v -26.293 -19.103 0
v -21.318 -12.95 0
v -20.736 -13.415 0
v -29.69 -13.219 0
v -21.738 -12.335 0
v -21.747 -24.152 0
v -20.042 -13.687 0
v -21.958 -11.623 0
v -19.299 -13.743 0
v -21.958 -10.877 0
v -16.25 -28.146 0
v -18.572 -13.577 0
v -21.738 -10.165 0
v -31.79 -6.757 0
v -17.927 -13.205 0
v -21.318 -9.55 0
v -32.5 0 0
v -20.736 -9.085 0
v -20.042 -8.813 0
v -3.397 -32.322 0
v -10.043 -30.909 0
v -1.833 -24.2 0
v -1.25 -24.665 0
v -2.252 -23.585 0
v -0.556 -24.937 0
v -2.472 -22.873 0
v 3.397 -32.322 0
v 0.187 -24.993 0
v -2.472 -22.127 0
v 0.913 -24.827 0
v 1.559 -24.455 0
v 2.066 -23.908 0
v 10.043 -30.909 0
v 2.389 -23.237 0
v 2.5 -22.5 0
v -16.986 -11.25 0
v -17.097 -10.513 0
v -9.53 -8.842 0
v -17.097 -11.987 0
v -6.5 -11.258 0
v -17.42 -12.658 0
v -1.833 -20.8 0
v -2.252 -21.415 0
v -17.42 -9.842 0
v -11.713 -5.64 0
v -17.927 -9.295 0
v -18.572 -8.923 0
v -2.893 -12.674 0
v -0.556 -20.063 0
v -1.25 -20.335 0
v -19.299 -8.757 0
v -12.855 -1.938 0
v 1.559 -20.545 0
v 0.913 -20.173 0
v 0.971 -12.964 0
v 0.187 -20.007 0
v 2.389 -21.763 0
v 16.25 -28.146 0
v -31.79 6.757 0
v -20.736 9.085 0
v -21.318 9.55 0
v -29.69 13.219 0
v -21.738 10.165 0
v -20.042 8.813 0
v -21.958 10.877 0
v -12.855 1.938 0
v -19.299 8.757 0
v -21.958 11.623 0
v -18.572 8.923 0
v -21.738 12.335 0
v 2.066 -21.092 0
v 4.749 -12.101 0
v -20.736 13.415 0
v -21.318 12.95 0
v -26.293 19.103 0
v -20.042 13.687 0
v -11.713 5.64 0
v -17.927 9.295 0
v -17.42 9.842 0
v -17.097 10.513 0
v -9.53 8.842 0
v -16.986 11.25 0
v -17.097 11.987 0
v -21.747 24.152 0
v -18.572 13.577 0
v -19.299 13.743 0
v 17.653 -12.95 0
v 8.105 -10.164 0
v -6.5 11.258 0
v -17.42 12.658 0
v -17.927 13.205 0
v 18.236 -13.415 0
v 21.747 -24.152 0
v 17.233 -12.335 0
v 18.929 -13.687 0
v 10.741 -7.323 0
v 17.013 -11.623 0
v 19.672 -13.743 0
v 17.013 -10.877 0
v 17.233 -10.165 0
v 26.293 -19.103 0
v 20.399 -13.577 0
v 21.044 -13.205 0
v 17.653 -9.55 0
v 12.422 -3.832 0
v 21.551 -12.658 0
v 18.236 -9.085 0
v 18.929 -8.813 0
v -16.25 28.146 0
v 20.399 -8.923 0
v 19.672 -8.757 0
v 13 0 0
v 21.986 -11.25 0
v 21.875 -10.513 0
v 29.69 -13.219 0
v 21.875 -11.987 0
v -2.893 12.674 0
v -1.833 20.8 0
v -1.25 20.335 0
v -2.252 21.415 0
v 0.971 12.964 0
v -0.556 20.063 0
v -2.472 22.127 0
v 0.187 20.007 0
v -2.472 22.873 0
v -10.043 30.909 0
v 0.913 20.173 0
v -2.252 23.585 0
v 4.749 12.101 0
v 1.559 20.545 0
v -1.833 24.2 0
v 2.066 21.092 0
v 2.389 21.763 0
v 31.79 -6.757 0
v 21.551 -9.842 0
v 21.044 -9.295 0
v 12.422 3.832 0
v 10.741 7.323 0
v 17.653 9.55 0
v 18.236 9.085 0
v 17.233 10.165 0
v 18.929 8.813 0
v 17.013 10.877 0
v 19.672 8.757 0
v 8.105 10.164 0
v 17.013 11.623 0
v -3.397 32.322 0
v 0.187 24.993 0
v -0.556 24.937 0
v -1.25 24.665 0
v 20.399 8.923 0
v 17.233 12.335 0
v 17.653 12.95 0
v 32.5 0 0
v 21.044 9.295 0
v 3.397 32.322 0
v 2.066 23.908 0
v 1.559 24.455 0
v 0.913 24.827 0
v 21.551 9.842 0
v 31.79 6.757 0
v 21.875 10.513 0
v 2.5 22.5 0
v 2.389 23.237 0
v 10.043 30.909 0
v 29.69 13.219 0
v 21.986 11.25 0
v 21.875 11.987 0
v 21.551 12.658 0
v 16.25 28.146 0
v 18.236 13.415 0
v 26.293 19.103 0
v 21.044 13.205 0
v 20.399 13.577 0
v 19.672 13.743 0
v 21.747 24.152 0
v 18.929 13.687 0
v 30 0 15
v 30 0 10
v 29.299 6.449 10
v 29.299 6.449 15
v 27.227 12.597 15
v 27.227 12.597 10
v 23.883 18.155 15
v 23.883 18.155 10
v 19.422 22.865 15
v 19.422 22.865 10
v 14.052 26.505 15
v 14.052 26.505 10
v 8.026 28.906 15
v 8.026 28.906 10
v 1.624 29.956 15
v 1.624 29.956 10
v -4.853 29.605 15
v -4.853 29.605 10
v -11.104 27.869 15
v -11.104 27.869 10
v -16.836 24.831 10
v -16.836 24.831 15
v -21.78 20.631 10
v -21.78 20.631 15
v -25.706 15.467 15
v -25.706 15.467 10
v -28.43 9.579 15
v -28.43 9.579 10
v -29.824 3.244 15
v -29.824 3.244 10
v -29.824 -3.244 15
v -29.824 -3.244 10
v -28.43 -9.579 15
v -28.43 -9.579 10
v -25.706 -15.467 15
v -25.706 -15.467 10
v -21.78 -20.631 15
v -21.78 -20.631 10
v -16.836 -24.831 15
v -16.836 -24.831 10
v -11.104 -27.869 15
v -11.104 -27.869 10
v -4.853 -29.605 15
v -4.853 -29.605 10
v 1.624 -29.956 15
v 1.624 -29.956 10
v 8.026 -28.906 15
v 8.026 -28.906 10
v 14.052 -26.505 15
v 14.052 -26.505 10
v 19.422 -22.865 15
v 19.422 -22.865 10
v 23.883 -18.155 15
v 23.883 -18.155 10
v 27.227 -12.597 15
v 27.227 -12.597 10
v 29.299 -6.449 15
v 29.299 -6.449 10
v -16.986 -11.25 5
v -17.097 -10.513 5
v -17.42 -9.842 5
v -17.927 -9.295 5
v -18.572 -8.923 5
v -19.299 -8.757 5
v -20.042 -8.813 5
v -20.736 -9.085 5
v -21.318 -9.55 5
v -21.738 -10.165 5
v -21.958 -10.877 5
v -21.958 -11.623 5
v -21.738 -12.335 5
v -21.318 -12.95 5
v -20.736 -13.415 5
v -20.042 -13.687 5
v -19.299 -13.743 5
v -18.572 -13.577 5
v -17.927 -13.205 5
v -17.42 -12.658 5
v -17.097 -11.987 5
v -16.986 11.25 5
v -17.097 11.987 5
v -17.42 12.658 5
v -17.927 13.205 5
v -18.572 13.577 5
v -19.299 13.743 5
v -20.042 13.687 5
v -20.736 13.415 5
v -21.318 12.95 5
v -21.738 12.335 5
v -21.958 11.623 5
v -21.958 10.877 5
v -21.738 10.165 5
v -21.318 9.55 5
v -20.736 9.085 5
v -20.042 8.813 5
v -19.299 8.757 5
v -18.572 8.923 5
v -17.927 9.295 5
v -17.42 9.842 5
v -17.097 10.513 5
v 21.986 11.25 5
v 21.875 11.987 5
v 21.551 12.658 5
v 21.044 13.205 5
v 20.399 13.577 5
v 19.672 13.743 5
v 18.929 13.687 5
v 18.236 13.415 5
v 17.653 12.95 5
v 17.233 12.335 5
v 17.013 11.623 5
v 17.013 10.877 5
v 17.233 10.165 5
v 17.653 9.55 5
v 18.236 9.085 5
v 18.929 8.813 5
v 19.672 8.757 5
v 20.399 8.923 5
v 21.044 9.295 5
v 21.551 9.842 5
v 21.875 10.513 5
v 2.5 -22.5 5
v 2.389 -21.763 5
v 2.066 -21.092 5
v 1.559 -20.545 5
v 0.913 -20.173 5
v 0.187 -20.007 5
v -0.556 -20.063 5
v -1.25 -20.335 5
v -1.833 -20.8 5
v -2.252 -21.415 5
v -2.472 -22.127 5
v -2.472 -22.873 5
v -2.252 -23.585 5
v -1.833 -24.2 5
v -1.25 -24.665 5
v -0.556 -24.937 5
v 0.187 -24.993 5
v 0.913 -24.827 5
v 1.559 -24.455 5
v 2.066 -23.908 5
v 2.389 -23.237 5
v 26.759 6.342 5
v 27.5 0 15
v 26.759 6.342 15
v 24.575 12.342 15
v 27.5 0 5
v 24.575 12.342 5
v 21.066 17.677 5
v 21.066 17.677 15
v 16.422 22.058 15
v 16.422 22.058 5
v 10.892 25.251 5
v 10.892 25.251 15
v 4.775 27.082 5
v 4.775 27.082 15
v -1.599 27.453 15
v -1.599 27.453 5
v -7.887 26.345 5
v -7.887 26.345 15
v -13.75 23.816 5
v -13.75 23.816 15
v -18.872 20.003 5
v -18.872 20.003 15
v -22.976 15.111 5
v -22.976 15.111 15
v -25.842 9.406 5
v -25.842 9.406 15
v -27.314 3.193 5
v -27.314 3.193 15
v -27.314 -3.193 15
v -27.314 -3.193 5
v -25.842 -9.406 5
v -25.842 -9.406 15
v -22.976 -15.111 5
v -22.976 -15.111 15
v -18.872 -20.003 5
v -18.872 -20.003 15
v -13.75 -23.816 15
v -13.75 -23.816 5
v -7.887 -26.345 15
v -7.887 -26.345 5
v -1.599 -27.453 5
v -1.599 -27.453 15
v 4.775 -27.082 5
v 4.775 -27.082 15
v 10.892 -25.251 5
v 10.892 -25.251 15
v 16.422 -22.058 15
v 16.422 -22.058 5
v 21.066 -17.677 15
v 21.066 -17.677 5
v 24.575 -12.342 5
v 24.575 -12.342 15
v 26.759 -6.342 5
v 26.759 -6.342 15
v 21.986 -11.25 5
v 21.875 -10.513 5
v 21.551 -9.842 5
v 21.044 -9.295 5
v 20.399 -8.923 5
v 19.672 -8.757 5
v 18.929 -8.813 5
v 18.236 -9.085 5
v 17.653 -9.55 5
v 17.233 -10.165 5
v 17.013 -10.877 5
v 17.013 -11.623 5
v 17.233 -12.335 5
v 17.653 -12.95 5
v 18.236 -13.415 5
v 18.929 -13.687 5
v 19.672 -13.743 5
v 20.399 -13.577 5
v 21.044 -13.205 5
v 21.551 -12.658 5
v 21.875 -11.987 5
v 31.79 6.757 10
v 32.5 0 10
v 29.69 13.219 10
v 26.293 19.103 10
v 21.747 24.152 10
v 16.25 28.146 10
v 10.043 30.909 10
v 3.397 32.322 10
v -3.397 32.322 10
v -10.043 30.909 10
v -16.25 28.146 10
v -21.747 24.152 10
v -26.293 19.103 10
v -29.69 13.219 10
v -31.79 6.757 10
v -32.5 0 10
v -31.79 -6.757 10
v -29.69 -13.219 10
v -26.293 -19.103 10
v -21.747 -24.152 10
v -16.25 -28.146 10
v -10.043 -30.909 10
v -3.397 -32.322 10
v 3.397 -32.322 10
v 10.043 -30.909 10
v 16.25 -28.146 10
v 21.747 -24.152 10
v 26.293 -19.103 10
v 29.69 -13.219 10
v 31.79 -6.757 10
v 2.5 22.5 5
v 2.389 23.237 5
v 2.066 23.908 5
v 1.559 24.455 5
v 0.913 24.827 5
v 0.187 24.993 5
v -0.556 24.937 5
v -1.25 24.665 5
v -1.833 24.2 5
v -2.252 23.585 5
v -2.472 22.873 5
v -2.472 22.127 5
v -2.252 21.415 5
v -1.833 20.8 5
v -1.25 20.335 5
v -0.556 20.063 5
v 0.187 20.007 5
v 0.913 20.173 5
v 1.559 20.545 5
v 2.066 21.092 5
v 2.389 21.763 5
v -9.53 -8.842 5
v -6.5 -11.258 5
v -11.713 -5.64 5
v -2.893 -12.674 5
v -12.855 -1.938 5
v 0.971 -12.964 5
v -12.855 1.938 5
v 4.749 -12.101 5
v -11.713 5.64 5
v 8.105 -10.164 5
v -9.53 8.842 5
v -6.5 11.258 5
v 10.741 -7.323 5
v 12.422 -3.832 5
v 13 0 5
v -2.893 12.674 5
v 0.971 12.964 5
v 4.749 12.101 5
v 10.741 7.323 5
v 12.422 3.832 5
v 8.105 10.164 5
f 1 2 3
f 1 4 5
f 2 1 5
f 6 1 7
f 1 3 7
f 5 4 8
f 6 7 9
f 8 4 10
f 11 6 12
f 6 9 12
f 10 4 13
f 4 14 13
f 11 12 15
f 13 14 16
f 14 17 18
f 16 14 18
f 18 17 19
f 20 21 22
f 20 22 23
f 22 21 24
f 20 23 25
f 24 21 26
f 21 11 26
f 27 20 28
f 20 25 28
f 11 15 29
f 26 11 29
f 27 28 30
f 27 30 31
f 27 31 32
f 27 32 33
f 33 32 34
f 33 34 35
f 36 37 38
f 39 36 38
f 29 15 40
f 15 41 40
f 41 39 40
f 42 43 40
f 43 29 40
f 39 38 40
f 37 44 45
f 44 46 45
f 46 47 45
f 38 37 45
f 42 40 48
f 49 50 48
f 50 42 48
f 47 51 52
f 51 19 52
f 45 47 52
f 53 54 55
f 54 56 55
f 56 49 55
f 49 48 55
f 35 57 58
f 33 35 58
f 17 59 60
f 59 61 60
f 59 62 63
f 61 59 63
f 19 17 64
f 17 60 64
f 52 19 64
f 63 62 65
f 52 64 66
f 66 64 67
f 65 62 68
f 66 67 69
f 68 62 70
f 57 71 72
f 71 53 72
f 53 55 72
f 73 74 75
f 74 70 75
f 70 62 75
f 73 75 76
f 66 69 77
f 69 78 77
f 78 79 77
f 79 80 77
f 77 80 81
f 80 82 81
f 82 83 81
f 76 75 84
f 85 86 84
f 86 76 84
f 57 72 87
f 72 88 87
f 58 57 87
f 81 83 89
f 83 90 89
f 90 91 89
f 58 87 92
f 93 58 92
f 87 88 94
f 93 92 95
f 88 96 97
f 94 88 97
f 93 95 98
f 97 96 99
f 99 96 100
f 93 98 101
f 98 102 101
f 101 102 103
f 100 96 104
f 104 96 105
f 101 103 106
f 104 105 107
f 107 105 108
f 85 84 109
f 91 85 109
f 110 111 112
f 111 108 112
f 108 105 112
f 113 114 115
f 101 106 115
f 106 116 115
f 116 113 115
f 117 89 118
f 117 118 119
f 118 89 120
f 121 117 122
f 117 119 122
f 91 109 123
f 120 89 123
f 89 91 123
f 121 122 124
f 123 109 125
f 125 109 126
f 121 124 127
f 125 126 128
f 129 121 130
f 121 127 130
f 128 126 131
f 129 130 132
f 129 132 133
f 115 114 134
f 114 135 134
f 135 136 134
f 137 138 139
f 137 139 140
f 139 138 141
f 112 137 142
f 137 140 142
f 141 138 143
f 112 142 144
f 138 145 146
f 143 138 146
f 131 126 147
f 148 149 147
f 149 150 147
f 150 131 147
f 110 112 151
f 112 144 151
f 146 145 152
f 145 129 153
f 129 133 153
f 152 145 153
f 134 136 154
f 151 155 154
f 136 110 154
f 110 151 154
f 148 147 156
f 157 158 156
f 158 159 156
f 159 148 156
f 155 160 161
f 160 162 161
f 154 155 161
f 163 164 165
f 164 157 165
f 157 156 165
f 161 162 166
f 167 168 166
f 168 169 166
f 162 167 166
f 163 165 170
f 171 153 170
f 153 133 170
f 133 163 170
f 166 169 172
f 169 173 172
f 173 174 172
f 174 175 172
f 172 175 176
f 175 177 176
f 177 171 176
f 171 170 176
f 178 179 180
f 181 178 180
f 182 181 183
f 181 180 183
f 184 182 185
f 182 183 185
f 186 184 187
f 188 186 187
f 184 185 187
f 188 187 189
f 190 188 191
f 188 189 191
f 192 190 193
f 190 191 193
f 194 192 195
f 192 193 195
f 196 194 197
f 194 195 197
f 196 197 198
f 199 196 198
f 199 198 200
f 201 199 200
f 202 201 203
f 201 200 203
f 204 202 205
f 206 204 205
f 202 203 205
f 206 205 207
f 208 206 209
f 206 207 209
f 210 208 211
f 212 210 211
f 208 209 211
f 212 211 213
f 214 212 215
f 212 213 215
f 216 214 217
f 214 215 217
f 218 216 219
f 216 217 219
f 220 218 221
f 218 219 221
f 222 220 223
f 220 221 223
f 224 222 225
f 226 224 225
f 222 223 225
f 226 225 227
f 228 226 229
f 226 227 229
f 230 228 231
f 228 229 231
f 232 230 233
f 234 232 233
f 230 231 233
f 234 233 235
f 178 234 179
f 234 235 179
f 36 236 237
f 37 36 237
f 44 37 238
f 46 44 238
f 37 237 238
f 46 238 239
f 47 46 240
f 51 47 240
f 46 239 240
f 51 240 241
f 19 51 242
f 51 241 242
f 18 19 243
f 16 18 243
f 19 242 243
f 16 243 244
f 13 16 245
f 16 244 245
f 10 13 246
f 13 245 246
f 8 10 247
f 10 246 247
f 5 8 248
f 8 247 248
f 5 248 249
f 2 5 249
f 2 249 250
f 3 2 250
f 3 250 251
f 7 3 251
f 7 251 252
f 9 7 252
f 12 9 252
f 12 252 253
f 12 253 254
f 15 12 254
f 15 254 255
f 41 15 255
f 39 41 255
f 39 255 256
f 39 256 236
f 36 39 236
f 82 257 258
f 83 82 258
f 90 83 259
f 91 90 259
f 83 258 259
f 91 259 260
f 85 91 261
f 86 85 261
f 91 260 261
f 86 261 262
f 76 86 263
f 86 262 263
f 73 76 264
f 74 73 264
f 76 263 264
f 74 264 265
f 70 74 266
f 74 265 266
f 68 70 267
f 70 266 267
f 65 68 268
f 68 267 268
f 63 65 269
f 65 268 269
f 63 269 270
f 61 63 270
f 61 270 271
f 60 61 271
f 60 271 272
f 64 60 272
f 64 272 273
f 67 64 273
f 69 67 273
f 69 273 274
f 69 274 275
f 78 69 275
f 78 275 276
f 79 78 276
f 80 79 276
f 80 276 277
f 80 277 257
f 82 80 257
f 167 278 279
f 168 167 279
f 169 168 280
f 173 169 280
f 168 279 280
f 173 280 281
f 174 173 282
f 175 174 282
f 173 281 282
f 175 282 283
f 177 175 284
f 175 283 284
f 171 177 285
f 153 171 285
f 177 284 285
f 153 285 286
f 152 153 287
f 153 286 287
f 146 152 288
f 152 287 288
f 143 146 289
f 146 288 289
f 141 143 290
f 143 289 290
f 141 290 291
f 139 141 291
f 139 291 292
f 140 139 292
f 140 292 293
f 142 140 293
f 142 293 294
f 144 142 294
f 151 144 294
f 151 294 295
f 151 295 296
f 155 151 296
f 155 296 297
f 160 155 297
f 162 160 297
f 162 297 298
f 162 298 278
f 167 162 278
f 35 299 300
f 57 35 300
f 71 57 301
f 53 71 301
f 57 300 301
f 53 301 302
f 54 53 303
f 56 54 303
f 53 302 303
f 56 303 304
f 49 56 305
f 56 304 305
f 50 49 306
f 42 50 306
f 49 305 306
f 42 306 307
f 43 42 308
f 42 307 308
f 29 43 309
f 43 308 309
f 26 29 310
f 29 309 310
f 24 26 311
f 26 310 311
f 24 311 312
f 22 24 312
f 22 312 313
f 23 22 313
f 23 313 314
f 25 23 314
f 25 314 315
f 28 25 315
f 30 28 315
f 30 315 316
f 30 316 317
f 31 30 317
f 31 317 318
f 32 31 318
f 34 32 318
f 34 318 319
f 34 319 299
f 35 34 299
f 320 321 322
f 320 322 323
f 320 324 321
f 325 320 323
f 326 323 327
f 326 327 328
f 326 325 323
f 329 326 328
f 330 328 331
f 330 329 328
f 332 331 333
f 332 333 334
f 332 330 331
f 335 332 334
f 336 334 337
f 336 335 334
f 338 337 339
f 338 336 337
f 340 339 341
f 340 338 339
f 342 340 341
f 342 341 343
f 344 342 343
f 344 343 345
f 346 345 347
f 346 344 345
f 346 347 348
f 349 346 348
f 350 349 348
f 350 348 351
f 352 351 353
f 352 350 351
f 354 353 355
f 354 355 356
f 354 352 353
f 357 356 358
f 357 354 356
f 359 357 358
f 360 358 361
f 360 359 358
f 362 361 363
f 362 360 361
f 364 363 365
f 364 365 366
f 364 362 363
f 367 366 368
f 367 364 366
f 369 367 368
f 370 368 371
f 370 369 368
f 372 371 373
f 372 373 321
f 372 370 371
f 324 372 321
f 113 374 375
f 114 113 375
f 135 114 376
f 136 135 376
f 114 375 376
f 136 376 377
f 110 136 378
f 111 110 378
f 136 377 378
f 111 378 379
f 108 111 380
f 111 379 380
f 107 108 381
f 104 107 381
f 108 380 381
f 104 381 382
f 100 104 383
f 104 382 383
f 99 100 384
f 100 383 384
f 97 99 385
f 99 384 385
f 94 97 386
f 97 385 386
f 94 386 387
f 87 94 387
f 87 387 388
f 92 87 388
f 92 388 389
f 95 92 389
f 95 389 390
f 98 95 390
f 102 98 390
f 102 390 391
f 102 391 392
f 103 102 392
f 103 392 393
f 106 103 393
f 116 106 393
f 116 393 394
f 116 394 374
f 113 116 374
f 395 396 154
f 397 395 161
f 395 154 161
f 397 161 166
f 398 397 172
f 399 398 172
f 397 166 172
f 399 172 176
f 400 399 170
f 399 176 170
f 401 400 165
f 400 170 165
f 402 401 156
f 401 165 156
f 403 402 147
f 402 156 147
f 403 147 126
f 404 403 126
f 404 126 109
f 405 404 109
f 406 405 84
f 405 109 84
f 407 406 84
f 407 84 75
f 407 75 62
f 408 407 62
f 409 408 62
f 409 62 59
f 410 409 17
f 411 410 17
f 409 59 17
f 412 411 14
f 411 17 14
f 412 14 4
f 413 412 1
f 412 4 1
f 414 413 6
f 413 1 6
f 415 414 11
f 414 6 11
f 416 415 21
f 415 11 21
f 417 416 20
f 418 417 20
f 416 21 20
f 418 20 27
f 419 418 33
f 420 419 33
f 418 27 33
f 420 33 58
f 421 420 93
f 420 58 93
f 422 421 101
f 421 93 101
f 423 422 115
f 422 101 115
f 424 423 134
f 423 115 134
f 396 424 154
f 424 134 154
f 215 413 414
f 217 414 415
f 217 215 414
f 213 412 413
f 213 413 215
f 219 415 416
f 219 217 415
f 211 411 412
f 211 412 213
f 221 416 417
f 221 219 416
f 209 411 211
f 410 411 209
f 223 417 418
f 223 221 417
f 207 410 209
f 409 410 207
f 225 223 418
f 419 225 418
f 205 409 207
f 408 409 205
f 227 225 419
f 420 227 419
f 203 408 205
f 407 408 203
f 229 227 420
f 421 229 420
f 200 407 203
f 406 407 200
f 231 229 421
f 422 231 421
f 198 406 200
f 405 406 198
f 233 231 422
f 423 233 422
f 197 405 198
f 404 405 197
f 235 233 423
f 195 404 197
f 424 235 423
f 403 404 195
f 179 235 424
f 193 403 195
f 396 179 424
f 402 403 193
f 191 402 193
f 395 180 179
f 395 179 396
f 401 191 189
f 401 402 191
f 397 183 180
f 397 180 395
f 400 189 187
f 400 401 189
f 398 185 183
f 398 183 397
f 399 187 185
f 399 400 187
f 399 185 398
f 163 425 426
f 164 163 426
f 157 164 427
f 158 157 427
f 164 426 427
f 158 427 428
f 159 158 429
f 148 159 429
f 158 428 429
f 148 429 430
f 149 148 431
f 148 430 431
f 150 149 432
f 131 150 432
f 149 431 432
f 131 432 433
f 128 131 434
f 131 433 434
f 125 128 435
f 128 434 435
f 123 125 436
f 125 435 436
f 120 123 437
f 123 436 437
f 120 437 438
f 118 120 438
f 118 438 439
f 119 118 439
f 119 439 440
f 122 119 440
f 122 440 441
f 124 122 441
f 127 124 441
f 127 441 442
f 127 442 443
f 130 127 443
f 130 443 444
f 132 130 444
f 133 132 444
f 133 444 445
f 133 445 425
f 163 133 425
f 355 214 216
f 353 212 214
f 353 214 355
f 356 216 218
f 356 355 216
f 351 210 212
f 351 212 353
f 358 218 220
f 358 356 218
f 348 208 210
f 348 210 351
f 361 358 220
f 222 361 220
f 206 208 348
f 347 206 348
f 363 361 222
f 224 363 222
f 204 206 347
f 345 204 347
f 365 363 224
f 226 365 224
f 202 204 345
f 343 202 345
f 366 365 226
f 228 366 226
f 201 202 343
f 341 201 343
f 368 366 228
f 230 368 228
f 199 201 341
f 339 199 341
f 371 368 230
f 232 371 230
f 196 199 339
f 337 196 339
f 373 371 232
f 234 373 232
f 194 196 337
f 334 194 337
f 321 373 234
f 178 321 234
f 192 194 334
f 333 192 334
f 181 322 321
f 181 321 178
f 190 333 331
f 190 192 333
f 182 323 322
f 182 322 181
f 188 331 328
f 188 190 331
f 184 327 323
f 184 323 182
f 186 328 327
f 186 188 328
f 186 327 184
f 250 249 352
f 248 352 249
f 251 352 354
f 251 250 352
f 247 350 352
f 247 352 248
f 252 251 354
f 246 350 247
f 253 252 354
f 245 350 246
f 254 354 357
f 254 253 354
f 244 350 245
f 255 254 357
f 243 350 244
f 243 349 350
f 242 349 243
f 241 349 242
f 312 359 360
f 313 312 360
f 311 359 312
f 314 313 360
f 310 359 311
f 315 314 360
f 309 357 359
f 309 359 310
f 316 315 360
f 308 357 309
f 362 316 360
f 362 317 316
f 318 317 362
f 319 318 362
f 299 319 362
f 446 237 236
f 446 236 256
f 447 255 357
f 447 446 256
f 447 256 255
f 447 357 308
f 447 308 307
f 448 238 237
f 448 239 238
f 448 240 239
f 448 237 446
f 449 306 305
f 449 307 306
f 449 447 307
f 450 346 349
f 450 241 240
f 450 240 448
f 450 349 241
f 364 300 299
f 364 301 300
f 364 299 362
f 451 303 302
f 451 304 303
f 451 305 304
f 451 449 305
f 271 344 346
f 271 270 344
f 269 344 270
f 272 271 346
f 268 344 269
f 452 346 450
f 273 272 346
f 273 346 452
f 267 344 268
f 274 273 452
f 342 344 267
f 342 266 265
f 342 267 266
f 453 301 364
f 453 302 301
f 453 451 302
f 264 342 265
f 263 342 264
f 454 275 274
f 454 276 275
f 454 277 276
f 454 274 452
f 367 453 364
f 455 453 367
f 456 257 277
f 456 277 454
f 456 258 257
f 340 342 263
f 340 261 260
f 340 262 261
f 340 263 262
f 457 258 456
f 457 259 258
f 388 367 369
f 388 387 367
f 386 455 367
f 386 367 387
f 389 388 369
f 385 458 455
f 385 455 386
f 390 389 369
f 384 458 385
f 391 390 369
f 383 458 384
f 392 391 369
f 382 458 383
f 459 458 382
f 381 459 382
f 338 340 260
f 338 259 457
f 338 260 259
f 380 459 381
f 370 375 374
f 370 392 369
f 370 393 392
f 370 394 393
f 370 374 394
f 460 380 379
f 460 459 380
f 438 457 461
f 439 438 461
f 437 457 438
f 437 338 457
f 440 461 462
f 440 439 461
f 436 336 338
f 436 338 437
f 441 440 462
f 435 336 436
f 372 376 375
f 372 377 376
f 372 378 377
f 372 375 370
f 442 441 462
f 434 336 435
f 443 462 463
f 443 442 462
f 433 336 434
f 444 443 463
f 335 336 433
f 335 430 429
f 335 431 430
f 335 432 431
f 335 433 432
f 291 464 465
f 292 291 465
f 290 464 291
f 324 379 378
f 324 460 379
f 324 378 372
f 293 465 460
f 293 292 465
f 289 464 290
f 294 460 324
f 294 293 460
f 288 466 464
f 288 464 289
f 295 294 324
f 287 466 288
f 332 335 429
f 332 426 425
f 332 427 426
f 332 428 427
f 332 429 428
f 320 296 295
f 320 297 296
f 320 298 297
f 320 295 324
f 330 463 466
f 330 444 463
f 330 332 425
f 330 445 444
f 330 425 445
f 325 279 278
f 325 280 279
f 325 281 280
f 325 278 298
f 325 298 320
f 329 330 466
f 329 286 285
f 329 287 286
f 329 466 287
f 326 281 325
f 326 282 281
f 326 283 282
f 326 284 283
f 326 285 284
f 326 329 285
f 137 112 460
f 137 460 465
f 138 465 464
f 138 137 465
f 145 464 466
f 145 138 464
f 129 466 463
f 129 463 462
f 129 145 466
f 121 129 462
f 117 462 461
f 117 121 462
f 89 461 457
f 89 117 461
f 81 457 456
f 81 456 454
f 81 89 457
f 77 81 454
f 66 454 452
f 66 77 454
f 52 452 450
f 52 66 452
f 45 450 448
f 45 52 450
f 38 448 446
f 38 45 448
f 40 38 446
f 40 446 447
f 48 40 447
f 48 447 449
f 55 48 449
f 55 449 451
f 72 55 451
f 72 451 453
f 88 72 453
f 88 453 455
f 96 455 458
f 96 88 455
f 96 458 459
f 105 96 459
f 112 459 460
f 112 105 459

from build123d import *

# Parameters (mm, degrees)
SKETCH_1_R          = 32.5
SKETCH_1_R_2        = 13
EXTRUDE_1_DEPTH     = 5
SKETCH_2_R          = 32.5
SKETCH_2_R_2        = 27.5
EXTRUDE_2_DEPTH     = 5
SKETCH_3_R          = 2.5
CUT_EXTRUDE_1_DEPTH = 47.233105022
SKETCH_4_R          = 30
SKETCH_4_R_2        = 27.5
EXTRUDE_3_DEPTH     = 5


with BuildPart() as part:
    # 草图1 → 凸台-拉伸1 (new body)
    with BuildSketch(Plane.XY):
        Circle(SKETCH_1_R)
        Circle(SKETCH_1_R_2, mode=Mode.SUBTRACT)
    extrude(amount=EXTRUDE_1_DEPTH)

    # 草图2 → 凸台-拉伸2 (add)
    with BuildSketch(Plane.XY.offset(5)):
        Circle(SKETCH_2_R)
        Circle(SKETCH_2_R_2, mode=Mode.SUBTRACT)
    extrude(amount=EXTRUDE_2_DEPTH)

    # 草图3 → 切除-拉伸1 (cut, through all)
    with BuildSketch(Plane.XY.offset(5)):
        with Locations((0, 22.5)):
            Circle(SKETCH_3_R)
        with Locations((19.485571585, 11.25)):
            Circle(SKETCH_3_R)
        with Locations((19.485571585, -11.25)):
            Circle(SKETCH_3_R)
        with Locations((0, -22.5)):
            Circle(SKETCH_3_R)
        with Locations((-19.485571585, -11.25)):
            Circle(SKETCH_3_R)
        with Locations((-19.485571585, 11.25)):
            Circle(SKETCH_3_R)
    extrude(amount=-CUT_EXTRUDE_1_DEPTH, mode=Mode.SUBTRACT)

    # 草图4 → 凸台-拉伸3 (add)
    with BuildSketch(Plane.XY.offset(10)):
        Circle(SKETCH_4_R)
        Circle(SKETCH_4_R_2, mode=Mode.SUBTRACT)
    extrude(amount=EXTRUDE_3_DEPTH)


solid = part.part
